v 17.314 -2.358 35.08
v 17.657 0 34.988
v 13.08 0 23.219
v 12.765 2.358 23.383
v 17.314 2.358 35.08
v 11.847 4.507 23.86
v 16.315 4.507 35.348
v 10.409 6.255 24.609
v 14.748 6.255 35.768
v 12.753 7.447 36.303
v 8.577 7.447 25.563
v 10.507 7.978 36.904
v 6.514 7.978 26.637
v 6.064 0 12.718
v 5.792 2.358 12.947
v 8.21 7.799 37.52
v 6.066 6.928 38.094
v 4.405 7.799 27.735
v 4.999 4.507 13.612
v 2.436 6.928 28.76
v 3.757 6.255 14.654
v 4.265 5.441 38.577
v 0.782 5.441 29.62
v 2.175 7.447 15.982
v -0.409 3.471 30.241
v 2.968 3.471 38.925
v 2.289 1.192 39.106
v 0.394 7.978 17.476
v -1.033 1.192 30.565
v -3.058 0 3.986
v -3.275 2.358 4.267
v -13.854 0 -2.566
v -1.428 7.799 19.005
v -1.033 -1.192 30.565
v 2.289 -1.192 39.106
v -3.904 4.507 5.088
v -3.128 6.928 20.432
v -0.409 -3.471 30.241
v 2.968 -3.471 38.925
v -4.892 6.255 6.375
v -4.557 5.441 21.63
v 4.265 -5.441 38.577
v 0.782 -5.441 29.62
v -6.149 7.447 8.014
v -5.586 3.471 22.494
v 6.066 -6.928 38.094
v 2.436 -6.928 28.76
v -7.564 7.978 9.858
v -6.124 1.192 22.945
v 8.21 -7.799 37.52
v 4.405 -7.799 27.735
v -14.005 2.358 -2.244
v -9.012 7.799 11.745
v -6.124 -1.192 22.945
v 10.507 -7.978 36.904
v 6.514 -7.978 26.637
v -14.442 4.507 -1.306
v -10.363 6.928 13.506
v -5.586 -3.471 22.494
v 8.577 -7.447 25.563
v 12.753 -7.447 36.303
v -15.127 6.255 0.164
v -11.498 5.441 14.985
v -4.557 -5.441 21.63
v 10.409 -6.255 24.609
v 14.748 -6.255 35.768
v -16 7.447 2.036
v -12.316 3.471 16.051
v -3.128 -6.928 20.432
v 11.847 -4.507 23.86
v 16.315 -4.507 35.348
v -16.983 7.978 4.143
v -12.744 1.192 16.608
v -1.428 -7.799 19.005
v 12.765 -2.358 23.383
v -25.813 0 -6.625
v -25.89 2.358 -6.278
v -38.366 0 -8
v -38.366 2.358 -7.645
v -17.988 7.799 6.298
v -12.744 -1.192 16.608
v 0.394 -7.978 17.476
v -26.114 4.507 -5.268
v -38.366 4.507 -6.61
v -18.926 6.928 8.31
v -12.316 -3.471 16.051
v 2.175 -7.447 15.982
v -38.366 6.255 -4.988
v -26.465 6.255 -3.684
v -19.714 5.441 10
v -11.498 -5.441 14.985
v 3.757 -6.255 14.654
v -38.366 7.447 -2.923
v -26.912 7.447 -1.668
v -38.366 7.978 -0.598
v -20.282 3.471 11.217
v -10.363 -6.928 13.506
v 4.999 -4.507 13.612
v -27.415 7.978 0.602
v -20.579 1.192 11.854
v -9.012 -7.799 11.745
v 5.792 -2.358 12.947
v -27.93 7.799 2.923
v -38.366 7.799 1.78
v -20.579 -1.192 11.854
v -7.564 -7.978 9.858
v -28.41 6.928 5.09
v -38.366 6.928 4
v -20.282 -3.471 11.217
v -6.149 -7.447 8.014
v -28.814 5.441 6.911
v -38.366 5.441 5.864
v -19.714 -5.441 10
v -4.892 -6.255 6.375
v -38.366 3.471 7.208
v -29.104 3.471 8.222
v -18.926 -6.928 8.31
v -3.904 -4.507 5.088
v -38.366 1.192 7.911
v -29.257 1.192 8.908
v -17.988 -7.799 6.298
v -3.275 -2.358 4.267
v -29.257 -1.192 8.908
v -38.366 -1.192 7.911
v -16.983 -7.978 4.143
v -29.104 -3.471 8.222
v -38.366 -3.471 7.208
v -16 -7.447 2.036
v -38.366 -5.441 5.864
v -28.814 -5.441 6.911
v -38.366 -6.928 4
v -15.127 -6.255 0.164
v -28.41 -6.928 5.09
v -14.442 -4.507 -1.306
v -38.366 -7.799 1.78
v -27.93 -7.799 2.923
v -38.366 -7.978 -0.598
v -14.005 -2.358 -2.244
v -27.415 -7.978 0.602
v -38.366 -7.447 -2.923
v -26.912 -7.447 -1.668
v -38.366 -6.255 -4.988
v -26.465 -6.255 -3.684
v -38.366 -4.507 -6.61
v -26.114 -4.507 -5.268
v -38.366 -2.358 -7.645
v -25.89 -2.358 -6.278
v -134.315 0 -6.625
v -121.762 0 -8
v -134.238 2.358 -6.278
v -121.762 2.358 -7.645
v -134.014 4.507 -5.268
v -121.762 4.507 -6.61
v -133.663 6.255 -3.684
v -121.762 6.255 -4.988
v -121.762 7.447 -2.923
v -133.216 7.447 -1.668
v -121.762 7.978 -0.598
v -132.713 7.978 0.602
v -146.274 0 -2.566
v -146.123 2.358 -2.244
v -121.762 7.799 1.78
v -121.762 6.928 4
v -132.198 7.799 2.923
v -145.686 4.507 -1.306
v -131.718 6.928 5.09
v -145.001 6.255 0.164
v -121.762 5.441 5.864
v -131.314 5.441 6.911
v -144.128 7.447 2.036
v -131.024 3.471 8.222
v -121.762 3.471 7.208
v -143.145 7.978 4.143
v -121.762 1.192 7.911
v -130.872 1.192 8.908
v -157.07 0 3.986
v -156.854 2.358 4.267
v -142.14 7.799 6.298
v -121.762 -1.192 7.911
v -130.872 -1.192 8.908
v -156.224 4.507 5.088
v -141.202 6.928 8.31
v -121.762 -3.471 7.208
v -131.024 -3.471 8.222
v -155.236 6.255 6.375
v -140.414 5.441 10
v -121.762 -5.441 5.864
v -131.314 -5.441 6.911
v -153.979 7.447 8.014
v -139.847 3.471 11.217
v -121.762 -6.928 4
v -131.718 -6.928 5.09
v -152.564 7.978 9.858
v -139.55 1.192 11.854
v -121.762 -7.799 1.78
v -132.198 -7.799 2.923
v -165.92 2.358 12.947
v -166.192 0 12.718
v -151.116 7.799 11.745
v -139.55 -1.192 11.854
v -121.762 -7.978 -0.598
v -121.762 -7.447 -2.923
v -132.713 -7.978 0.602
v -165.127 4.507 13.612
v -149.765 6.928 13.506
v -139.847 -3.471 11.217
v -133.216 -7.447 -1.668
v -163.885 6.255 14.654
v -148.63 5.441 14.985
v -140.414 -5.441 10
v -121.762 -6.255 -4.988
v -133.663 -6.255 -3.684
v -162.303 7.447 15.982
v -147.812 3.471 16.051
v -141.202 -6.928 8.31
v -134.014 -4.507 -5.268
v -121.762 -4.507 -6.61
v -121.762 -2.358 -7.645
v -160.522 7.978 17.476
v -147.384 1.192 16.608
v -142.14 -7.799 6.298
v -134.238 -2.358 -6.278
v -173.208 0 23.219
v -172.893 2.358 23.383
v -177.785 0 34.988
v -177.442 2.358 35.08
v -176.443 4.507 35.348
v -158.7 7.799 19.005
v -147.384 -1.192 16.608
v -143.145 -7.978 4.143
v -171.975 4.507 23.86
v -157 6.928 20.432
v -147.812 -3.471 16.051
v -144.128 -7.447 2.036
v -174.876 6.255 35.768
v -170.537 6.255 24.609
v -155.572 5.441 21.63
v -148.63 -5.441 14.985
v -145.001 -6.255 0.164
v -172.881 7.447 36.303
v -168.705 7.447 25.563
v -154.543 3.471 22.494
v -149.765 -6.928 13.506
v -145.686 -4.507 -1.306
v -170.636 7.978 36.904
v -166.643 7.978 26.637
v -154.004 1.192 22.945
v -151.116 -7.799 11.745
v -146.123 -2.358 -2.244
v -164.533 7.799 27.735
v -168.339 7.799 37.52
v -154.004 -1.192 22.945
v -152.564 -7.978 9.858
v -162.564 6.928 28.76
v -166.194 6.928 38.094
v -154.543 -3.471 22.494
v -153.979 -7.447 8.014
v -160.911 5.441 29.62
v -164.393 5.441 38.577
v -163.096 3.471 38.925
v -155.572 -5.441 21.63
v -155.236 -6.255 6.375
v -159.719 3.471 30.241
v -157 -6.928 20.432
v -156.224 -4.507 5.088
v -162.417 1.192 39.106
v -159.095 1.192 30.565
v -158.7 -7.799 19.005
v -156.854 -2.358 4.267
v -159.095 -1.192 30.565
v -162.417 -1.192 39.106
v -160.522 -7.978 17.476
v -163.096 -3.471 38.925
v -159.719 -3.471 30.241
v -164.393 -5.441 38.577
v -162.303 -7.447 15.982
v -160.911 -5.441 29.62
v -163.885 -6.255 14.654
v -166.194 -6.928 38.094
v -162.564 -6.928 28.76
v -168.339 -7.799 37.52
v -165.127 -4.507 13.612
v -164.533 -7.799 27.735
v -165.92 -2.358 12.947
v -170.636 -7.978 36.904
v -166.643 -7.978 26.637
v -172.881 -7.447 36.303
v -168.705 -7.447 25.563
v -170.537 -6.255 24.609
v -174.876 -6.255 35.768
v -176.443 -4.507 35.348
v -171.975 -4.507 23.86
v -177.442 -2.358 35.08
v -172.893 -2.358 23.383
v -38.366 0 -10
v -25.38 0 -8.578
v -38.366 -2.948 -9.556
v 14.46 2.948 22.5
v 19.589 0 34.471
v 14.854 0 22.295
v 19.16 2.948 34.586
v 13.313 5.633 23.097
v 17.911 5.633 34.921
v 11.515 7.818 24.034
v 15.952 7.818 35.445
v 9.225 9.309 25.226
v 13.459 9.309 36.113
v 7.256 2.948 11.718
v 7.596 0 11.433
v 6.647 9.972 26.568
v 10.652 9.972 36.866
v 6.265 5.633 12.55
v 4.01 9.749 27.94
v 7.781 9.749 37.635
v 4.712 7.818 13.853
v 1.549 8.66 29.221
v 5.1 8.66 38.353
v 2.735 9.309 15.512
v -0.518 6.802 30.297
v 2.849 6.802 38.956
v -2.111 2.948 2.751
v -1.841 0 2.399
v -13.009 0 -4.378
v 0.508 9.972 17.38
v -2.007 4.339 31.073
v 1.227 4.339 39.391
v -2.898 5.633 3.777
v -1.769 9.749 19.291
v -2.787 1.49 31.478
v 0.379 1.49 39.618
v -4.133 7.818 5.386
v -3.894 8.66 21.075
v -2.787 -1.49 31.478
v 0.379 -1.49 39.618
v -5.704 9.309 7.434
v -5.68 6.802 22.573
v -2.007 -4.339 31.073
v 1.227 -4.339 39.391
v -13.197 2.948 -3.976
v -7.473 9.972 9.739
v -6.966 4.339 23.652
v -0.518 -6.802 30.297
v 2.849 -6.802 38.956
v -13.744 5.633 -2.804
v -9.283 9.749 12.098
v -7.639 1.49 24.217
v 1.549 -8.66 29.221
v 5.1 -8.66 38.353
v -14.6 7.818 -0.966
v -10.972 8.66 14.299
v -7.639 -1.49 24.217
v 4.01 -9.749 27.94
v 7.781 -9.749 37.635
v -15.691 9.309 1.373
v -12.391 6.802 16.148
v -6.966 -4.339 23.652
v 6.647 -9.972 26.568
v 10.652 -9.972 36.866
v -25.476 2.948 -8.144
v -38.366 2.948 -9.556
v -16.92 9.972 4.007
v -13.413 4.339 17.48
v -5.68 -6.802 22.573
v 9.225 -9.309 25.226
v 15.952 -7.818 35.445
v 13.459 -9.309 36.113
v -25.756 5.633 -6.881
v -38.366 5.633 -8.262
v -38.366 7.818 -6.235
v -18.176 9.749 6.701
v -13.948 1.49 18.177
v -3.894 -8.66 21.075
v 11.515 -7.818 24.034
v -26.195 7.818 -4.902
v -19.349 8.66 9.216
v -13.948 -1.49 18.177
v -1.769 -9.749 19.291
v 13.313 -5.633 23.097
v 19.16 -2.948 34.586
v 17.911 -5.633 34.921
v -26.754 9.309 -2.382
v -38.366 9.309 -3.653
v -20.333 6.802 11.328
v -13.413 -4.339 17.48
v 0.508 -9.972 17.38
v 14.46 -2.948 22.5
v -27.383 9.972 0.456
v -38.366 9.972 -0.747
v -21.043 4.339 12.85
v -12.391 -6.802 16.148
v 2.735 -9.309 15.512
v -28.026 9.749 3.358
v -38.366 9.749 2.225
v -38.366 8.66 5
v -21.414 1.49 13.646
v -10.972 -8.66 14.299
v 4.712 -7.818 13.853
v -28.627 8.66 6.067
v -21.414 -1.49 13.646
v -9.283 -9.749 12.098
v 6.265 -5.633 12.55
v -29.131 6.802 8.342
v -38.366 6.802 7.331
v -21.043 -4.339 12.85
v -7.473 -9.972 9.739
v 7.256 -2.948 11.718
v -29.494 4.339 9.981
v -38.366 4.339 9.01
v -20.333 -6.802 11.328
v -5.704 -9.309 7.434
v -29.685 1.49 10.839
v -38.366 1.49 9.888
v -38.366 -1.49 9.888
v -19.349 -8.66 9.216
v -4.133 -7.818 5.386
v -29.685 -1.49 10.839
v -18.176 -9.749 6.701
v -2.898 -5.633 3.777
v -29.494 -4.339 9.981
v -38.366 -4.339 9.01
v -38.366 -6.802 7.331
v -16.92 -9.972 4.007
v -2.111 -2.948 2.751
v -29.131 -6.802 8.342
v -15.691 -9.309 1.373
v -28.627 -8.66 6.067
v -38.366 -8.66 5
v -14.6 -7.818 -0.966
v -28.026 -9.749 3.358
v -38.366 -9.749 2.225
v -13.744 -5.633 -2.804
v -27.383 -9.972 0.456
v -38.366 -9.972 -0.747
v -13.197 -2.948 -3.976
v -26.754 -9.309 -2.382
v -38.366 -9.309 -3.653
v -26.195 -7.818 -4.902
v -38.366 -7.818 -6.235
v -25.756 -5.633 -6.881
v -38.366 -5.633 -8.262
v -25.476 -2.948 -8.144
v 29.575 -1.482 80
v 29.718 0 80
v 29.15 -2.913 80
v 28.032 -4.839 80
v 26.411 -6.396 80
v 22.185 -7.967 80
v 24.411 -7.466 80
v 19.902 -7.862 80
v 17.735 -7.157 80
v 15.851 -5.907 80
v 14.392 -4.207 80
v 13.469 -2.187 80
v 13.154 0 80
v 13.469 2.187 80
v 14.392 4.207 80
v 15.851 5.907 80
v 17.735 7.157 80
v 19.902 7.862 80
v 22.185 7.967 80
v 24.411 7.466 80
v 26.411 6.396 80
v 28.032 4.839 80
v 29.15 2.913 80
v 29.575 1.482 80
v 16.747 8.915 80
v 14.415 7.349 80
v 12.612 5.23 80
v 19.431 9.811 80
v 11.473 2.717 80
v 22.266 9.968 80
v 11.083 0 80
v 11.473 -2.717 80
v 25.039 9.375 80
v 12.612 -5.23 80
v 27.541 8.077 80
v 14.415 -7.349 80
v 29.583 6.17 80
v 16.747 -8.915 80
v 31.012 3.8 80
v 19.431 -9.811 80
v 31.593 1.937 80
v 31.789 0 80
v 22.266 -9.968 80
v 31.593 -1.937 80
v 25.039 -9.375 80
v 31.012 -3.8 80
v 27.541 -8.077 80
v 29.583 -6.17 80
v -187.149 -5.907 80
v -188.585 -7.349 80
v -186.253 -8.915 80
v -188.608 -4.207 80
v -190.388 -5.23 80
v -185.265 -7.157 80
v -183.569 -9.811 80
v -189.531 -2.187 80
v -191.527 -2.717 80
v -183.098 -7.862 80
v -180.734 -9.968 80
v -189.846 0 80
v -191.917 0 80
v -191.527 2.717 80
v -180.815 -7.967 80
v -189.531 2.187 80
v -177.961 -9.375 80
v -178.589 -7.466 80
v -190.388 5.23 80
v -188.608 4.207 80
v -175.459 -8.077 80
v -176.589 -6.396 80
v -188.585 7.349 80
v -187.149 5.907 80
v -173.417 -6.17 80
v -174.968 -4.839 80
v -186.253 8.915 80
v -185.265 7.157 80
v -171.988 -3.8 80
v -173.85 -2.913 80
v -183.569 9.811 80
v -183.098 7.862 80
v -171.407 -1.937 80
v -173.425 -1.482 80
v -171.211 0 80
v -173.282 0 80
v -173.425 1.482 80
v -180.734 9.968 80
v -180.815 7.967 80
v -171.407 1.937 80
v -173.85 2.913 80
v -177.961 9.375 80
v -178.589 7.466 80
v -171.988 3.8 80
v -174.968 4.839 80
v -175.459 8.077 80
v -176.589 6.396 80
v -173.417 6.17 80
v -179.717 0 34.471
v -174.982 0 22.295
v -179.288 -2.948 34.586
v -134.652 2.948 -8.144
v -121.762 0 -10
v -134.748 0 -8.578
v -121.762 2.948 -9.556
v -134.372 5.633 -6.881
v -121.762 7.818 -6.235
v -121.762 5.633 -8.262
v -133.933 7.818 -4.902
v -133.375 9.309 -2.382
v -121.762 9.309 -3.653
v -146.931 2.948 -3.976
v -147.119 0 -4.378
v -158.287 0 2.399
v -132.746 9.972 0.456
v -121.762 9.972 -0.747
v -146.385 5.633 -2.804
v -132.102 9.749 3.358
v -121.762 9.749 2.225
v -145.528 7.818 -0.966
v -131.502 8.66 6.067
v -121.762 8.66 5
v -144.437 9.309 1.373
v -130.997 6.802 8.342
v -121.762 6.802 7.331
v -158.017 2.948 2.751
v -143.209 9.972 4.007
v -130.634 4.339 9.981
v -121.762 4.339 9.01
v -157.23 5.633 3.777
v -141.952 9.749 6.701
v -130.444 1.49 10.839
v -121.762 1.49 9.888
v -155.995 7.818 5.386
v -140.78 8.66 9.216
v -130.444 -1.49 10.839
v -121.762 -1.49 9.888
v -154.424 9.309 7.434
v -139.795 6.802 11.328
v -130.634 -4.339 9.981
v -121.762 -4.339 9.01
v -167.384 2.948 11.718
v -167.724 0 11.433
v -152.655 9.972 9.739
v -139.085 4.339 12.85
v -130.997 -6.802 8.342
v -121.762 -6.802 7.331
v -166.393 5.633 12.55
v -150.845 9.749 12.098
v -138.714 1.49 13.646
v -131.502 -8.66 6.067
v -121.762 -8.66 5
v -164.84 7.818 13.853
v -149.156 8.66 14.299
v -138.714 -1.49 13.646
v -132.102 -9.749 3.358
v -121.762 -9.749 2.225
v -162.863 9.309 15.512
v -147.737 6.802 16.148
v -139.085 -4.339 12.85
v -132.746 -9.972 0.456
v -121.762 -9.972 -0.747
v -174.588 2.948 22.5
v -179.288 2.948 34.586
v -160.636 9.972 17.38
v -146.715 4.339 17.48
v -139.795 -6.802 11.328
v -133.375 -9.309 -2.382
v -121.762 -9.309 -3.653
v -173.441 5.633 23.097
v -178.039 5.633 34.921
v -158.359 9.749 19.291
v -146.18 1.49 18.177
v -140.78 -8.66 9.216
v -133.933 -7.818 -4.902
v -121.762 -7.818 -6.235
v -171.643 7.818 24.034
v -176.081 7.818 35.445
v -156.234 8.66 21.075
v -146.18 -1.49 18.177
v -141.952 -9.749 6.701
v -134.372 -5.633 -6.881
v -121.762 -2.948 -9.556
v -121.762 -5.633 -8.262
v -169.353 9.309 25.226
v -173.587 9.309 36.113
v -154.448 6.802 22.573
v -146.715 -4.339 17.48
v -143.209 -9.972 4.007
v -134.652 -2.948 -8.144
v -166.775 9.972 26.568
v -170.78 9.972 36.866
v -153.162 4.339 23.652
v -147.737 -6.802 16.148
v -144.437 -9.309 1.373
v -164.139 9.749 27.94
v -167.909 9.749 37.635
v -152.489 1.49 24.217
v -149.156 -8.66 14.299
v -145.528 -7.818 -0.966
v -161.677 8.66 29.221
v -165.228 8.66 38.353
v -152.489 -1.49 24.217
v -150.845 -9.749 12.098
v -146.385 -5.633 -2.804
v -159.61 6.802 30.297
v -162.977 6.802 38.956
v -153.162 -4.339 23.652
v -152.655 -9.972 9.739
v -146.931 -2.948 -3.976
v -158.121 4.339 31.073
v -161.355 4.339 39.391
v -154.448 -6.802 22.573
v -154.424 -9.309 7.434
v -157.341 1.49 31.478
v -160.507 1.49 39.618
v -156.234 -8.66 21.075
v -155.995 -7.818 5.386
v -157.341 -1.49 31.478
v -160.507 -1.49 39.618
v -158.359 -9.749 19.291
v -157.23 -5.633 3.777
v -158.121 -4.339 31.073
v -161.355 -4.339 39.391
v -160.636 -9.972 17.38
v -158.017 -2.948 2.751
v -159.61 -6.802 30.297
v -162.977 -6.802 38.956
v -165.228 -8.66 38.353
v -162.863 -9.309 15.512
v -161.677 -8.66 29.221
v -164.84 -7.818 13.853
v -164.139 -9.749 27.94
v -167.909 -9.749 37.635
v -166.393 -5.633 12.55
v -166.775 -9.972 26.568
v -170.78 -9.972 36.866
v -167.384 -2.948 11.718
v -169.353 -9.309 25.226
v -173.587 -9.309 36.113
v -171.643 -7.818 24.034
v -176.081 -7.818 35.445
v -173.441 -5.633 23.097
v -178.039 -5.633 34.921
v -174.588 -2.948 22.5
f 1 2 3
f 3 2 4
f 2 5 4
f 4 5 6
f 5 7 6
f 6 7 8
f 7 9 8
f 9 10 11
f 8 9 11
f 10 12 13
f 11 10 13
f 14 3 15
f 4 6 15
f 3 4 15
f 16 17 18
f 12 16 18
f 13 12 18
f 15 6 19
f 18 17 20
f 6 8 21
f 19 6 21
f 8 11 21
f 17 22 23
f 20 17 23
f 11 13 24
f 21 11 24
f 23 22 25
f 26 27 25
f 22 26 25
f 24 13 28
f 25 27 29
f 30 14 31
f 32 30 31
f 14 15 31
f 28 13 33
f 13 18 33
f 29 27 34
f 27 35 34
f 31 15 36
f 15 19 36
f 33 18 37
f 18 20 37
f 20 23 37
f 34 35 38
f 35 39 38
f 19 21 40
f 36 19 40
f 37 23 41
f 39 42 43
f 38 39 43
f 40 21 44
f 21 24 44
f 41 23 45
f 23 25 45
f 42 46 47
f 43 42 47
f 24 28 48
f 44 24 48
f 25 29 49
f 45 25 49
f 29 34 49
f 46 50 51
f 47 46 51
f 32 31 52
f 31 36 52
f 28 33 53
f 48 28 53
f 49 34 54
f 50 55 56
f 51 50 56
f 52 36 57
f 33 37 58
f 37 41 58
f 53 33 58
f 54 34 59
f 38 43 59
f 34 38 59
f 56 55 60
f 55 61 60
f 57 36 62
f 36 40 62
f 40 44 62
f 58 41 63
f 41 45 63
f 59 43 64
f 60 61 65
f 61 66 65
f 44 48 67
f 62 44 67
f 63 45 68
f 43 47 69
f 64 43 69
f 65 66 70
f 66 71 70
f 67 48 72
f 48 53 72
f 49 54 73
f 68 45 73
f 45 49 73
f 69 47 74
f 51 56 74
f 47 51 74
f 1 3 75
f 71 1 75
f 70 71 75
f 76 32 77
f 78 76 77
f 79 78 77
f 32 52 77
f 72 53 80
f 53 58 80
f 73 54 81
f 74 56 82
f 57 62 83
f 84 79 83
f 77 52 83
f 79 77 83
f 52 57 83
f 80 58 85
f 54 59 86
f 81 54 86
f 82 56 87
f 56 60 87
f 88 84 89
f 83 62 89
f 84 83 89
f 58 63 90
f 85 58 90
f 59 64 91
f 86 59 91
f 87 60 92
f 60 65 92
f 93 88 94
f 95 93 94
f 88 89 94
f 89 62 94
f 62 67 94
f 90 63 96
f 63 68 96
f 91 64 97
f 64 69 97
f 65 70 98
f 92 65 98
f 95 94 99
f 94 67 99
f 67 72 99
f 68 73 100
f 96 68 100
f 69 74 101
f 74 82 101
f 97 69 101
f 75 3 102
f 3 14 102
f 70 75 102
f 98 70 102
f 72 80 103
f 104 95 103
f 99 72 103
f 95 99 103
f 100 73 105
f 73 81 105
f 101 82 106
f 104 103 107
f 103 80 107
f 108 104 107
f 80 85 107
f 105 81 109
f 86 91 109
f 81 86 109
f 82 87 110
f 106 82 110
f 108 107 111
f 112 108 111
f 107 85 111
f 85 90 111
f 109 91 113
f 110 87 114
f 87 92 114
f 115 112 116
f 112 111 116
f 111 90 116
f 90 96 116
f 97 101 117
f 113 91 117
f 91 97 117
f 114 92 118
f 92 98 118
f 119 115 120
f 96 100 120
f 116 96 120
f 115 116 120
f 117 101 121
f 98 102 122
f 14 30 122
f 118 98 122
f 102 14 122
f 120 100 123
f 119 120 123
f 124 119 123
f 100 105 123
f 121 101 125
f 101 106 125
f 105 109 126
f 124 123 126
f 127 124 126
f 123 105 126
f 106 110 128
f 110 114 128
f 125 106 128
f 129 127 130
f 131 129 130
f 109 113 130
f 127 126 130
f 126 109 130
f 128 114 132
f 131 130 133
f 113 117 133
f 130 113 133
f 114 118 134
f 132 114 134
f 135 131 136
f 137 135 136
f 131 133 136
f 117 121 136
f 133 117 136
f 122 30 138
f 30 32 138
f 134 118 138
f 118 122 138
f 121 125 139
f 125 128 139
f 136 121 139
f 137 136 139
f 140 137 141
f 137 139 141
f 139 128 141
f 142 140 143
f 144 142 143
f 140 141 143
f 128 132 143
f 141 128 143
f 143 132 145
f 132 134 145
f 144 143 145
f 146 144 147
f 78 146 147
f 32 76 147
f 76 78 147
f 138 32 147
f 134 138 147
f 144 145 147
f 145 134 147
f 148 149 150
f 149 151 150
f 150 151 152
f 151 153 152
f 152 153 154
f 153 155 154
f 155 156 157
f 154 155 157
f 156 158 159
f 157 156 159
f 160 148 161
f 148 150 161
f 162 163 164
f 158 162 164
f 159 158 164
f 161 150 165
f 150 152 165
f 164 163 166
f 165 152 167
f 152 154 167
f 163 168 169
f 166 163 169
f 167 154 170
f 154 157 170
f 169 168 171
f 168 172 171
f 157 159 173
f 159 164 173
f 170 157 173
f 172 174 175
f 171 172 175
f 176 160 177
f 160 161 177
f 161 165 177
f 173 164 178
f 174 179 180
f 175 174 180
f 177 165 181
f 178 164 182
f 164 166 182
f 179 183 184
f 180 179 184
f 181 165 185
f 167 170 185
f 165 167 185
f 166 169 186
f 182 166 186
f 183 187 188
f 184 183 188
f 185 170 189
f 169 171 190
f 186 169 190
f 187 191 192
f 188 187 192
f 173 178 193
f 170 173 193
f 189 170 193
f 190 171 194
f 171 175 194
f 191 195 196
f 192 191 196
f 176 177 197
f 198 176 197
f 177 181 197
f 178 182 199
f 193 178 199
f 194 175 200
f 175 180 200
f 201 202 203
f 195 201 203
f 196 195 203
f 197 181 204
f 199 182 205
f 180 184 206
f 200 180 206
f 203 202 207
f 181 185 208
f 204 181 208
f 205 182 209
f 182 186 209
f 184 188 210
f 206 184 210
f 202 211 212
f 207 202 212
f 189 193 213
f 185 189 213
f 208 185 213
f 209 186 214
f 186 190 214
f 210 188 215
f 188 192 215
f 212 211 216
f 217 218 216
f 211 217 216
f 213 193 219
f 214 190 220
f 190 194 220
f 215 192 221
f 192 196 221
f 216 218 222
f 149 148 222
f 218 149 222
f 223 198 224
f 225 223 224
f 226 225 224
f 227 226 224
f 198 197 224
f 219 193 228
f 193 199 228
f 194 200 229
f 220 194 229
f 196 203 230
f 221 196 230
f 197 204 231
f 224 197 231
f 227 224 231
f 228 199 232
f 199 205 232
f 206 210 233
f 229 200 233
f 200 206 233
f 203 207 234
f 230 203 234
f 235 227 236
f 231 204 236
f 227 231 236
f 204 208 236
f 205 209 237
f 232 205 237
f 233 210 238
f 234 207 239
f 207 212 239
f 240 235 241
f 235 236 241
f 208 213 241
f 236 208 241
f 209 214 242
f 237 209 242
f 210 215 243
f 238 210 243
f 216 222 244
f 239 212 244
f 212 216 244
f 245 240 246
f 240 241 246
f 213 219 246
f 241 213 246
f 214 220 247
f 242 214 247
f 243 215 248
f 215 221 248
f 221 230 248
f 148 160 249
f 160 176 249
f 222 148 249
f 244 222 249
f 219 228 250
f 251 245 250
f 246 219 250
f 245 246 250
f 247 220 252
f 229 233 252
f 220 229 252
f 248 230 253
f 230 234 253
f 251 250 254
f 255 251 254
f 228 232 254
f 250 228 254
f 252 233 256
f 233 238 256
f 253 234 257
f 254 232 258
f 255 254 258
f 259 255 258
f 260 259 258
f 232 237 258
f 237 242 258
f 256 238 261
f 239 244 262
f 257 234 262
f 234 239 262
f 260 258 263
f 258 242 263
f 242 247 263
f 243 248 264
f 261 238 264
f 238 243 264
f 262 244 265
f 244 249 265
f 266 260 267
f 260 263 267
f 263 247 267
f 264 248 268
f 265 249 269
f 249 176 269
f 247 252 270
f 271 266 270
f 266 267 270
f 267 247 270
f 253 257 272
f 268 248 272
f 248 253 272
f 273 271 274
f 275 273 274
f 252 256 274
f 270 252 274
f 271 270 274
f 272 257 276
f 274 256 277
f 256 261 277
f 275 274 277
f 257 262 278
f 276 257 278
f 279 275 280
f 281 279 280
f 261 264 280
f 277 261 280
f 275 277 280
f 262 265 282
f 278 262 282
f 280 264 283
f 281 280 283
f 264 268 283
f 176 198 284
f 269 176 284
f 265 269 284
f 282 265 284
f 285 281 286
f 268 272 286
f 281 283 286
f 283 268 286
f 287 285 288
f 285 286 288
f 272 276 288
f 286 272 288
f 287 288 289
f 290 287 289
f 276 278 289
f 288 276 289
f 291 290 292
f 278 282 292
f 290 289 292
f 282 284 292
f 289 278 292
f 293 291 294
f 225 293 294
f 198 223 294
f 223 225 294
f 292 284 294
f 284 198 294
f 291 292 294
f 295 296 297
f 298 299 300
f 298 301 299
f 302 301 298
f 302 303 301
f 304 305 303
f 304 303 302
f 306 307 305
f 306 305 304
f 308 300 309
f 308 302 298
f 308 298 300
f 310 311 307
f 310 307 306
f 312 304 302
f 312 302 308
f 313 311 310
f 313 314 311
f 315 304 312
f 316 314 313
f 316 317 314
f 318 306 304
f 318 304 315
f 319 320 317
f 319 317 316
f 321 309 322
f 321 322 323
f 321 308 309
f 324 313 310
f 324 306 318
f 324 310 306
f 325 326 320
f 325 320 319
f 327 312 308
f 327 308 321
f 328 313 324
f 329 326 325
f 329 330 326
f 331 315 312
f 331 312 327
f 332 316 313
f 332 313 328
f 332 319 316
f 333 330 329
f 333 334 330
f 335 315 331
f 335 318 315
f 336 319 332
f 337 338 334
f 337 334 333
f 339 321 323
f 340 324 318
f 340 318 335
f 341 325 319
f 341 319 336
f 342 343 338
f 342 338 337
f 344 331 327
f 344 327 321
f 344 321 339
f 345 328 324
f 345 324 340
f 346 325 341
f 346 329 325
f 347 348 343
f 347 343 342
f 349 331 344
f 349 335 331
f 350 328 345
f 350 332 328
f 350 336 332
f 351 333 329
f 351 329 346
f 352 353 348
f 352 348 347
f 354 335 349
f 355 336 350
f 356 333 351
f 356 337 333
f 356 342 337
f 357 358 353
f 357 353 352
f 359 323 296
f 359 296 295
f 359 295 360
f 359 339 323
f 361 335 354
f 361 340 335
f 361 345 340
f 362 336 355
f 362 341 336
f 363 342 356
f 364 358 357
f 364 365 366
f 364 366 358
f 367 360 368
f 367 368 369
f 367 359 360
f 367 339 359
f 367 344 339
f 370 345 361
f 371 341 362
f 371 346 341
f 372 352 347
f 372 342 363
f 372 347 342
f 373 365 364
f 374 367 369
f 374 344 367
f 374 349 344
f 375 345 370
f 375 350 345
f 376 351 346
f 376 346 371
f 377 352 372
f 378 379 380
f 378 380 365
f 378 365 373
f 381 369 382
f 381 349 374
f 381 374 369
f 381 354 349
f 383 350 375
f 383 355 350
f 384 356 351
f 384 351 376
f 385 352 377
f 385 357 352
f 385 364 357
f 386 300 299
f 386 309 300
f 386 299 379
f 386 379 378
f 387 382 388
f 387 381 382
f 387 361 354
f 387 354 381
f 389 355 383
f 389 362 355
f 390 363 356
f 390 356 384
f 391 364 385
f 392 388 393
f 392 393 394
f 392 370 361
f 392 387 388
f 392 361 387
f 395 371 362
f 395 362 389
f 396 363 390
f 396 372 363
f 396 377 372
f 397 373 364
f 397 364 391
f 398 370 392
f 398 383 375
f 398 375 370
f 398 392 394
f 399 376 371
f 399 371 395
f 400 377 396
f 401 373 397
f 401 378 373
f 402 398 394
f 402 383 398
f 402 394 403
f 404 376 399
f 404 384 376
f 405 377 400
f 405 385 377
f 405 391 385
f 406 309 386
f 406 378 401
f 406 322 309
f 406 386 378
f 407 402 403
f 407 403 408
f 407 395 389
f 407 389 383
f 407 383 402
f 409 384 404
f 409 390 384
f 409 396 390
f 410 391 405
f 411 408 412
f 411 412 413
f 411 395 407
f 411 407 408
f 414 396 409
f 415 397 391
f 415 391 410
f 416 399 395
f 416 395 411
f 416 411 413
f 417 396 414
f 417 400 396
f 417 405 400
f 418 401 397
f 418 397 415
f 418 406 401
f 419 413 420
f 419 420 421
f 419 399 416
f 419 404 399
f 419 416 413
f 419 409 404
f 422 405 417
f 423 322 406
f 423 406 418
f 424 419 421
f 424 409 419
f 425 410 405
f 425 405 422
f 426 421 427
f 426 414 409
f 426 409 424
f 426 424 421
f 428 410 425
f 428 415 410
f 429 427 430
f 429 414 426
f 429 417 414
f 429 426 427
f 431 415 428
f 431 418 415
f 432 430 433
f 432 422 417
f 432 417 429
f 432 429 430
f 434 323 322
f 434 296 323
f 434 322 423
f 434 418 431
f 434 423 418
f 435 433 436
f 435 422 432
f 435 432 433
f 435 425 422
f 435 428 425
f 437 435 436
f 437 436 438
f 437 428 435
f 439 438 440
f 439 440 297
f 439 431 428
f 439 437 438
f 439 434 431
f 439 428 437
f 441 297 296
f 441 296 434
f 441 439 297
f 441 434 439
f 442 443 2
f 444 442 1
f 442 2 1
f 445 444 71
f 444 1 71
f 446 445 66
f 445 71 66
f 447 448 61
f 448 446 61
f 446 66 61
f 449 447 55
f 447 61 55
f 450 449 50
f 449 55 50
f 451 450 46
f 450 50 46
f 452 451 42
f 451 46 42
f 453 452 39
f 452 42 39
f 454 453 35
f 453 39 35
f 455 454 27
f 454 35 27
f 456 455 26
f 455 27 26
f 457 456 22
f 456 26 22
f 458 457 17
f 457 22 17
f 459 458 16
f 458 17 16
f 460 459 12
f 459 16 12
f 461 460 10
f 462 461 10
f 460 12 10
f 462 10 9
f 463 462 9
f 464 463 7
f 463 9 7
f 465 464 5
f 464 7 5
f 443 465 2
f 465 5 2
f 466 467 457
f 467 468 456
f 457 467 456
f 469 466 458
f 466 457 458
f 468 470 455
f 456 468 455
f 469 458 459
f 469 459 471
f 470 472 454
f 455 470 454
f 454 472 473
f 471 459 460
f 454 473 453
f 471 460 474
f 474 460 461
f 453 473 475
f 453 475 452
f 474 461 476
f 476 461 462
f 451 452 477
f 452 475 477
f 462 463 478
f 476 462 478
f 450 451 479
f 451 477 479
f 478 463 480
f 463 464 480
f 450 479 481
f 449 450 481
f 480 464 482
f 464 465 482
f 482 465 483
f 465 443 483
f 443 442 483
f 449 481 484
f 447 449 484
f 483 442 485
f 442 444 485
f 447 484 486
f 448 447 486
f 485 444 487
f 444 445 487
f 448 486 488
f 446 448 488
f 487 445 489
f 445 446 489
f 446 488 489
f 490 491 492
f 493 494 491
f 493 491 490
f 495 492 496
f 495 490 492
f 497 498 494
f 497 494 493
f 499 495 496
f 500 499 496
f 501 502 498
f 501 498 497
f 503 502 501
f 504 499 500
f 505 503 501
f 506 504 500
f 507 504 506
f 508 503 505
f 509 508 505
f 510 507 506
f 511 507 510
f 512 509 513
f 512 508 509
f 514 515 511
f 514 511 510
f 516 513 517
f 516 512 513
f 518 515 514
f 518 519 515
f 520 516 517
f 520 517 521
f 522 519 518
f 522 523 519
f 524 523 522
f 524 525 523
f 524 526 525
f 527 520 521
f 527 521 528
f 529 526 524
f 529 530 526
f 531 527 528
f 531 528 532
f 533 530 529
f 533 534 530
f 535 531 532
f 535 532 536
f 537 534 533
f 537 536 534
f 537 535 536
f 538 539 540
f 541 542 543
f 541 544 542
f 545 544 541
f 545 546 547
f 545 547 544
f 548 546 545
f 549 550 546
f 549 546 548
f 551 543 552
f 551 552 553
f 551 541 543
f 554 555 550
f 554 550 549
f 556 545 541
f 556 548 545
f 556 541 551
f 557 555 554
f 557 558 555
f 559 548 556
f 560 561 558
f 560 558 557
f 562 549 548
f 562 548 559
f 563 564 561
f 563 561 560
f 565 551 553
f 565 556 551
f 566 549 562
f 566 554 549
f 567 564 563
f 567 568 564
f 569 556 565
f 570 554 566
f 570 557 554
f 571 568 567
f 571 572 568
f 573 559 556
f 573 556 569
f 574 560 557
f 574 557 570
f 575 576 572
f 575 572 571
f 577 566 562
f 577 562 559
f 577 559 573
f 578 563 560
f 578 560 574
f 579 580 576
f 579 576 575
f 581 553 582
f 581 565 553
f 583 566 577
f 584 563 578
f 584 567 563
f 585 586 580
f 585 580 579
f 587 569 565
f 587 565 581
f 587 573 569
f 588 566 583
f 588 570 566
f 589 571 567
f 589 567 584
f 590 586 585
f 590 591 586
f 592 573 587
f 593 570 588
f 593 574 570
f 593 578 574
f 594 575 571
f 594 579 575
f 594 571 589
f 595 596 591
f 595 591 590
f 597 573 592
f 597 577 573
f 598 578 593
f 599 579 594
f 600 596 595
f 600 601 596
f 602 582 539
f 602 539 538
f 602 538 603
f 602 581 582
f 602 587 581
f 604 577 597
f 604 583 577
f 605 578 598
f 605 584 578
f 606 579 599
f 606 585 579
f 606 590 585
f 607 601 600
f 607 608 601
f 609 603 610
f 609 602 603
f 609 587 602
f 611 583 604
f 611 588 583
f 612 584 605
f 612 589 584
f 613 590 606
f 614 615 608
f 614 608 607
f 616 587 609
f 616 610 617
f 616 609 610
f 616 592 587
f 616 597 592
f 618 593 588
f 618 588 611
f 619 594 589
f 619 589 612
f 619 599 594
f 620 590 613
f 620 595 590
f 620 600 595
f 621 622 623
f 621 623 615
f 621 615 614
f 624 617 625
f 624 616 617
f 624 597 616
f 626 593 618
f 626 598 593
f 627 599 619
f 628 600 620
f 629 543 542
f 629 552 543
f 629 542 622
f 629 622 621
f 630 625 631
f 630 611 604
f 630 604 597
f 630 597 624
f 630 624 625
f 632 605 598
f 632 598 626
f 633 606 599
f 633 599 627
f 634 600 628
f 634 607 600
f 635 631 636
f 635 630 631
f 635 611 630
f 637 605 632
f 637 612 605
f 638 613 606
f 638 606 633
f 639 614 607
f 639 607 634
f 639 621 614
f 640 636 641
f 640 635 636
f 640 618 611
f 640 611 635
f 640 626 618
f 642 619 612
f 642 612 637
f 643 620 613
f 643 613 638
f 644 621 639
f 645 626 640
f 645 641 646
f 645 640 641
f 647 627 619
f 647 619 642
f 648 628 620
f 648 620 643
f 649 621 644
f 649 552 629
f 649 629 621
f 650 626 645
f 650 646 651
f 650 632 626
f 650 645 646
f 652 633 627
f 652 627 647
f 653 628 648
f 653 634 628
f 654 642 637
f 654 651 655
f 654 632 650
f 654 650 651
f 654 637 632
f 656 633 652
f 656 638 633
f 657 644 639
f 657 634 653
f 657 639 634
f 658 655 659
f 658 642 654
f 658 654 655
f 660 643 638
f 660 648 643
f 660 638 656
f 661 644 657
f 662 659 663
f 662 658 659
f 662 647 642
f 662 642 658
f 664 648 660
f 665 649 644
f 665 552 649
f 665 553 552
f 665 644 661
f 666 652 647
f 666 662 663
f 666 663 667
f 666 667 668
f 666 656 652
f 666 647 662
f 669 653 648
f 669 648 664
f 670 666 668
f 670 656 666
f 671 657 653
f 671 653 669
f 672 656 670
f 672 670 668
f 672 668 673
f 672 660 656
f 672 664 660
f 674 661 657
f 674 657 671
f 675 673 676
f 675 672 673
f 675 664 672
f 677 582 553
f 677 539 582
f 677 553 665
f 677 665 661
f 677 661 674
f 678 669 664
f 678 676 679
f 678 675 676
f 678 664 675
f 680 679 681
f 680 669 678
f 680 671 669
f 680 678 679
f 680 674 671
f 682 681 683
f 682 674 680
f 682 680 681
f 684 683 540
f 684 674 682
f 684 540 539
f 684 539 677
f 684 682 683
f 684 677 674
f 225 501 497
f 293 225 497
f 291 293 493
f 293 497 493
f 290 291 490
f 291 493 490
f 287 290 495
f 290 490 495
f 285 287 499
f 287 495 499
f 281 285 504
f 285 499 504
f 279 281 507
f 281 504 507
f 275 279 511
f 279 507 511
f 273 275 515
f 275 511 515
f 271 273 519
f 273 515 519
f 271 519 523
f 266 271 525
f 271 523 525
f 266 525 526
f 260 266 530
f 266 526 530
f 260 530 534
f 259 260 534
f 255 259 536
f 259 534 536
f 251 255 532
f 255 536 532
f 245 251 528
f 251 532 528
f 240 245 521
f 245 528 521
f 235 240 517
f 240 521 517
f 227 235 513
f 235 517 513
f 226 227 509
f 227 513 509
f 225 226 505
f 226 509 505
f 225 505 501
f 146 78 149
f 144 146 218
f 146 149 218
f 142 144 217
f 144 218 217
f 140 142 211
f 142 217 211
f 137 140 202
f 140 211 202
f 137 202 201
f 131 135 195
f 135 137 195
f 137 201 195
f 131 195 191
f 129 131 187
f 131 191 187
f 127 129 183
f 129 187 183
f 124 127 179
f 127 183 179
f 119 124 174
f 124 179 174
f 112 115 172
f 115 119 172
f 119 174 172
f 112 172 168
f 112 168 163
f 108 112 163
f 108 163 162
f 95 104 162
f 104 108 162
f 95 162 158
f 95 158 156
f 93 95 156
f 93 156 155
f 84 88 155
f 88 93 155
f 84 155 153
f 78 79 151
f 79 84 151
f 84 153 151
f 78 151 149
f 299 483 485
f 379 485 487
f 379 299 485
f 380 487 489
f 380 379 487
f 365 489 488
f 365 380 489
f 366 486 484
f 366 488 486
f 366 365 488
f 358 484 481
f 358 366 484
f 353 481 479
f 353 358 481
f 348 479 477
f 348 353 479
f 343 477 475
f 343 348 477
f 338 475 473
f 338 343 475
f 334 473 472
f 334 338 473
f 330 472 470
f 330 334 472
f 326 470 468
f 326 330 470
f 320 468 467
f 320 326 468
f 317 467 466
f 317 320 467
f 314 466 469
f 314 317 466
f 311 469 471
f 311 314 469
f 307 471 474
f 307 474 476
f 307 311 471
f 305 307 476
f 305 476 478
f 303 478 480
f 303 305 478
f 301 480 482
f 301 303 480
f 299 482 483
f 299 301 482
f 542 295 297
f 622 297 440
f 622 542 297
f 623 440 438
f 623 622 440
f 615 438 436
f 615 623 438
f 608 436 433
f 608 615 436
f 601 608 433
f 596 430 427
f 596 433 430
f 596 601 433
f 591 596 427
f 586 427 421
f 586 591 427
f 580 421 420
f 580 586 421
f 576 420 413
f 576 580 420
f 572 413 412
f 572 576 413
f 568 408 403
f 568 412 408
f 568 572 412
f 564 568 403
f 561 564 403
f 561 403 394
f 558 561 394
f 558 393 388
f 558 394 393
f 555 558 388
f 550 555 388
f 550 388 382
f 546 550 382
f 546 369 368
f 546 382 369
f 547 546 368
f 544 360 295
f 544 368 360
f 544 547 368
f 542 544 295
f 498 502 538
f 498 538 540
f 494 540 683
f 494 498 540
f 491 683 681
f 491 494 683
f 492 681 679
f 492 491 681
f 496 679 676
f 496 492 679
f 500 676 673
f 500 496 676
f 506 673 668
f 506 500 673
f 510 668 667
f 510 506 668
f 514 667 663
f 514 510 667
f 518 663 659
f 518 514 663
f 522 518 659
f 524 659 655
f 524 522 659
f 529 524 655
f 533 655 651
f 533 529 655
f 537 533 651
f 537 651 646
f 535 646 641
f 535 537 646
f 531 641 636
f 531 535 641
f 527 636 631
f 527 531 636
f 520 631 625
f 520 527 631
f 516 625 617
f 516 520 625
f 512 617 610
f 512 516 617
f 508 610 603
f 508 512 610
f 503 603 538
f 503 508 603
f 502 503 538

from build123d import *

# Parameters (mm, degrees)
F2_R          = 10
F2_R_2        = 8
F4_W          = 386.4285405924
F4_H          = 84.6193959536
F5_DEPTH      = 10.0010001
F5_DEPTH_BACK = 10.0010001


with BuildPart() as f3:
    # F3: sweep along a path in F0
    with BuildLine(Plane.XZ) as f3_path:
        Line((26.7949192431, 100), (9.9299419155, 37.0590477449))
        ThreePointArc((9.9299419155, 37.0590477449), (-7.9282779485, 10.3323329854), (-38.3663493989, 0))
        Line((-38.3663493989, 0), (-121.7617798121, 0))
        ThreePointArc((-121.7617798121, 0), (-152.1998512625, 10.3323329854), (-170.0580711265, 37.0590477449))
        Line((-170.0580711265, 37.0590477449), (-186.9230484541, 100))
    # F2 (on line) → F3 (sweep)
    with BuildSketch(Plane(origin=(26.7949192431, 0, 100), x_dir=(0.9659258263, 0, -0.2588190451), z_dir=(0.2588190451, 0, 0.9659258263))):
        Circle(F2_R)
        Circle(F2_R_2, mode=Mode.SUBTRACT)
    sweep(path=f3_path.line)

    # F4 (on Front) → F5 (cut, two sides)
    with BuildSketch(Plane.XZ) as f5_sk:
        with Locations((-98.1307812035, 122.3096979768)):
            Rectangle(F4_W, F4_H)
    extrude(amount=-F5_DEPTH, mode=Mode.SUBTRACT)
    extrude(f5_sk.sketch, amount=F5_DEPTH_BACK, mode=Mode.SUBTRACT)


solid = f3.part
